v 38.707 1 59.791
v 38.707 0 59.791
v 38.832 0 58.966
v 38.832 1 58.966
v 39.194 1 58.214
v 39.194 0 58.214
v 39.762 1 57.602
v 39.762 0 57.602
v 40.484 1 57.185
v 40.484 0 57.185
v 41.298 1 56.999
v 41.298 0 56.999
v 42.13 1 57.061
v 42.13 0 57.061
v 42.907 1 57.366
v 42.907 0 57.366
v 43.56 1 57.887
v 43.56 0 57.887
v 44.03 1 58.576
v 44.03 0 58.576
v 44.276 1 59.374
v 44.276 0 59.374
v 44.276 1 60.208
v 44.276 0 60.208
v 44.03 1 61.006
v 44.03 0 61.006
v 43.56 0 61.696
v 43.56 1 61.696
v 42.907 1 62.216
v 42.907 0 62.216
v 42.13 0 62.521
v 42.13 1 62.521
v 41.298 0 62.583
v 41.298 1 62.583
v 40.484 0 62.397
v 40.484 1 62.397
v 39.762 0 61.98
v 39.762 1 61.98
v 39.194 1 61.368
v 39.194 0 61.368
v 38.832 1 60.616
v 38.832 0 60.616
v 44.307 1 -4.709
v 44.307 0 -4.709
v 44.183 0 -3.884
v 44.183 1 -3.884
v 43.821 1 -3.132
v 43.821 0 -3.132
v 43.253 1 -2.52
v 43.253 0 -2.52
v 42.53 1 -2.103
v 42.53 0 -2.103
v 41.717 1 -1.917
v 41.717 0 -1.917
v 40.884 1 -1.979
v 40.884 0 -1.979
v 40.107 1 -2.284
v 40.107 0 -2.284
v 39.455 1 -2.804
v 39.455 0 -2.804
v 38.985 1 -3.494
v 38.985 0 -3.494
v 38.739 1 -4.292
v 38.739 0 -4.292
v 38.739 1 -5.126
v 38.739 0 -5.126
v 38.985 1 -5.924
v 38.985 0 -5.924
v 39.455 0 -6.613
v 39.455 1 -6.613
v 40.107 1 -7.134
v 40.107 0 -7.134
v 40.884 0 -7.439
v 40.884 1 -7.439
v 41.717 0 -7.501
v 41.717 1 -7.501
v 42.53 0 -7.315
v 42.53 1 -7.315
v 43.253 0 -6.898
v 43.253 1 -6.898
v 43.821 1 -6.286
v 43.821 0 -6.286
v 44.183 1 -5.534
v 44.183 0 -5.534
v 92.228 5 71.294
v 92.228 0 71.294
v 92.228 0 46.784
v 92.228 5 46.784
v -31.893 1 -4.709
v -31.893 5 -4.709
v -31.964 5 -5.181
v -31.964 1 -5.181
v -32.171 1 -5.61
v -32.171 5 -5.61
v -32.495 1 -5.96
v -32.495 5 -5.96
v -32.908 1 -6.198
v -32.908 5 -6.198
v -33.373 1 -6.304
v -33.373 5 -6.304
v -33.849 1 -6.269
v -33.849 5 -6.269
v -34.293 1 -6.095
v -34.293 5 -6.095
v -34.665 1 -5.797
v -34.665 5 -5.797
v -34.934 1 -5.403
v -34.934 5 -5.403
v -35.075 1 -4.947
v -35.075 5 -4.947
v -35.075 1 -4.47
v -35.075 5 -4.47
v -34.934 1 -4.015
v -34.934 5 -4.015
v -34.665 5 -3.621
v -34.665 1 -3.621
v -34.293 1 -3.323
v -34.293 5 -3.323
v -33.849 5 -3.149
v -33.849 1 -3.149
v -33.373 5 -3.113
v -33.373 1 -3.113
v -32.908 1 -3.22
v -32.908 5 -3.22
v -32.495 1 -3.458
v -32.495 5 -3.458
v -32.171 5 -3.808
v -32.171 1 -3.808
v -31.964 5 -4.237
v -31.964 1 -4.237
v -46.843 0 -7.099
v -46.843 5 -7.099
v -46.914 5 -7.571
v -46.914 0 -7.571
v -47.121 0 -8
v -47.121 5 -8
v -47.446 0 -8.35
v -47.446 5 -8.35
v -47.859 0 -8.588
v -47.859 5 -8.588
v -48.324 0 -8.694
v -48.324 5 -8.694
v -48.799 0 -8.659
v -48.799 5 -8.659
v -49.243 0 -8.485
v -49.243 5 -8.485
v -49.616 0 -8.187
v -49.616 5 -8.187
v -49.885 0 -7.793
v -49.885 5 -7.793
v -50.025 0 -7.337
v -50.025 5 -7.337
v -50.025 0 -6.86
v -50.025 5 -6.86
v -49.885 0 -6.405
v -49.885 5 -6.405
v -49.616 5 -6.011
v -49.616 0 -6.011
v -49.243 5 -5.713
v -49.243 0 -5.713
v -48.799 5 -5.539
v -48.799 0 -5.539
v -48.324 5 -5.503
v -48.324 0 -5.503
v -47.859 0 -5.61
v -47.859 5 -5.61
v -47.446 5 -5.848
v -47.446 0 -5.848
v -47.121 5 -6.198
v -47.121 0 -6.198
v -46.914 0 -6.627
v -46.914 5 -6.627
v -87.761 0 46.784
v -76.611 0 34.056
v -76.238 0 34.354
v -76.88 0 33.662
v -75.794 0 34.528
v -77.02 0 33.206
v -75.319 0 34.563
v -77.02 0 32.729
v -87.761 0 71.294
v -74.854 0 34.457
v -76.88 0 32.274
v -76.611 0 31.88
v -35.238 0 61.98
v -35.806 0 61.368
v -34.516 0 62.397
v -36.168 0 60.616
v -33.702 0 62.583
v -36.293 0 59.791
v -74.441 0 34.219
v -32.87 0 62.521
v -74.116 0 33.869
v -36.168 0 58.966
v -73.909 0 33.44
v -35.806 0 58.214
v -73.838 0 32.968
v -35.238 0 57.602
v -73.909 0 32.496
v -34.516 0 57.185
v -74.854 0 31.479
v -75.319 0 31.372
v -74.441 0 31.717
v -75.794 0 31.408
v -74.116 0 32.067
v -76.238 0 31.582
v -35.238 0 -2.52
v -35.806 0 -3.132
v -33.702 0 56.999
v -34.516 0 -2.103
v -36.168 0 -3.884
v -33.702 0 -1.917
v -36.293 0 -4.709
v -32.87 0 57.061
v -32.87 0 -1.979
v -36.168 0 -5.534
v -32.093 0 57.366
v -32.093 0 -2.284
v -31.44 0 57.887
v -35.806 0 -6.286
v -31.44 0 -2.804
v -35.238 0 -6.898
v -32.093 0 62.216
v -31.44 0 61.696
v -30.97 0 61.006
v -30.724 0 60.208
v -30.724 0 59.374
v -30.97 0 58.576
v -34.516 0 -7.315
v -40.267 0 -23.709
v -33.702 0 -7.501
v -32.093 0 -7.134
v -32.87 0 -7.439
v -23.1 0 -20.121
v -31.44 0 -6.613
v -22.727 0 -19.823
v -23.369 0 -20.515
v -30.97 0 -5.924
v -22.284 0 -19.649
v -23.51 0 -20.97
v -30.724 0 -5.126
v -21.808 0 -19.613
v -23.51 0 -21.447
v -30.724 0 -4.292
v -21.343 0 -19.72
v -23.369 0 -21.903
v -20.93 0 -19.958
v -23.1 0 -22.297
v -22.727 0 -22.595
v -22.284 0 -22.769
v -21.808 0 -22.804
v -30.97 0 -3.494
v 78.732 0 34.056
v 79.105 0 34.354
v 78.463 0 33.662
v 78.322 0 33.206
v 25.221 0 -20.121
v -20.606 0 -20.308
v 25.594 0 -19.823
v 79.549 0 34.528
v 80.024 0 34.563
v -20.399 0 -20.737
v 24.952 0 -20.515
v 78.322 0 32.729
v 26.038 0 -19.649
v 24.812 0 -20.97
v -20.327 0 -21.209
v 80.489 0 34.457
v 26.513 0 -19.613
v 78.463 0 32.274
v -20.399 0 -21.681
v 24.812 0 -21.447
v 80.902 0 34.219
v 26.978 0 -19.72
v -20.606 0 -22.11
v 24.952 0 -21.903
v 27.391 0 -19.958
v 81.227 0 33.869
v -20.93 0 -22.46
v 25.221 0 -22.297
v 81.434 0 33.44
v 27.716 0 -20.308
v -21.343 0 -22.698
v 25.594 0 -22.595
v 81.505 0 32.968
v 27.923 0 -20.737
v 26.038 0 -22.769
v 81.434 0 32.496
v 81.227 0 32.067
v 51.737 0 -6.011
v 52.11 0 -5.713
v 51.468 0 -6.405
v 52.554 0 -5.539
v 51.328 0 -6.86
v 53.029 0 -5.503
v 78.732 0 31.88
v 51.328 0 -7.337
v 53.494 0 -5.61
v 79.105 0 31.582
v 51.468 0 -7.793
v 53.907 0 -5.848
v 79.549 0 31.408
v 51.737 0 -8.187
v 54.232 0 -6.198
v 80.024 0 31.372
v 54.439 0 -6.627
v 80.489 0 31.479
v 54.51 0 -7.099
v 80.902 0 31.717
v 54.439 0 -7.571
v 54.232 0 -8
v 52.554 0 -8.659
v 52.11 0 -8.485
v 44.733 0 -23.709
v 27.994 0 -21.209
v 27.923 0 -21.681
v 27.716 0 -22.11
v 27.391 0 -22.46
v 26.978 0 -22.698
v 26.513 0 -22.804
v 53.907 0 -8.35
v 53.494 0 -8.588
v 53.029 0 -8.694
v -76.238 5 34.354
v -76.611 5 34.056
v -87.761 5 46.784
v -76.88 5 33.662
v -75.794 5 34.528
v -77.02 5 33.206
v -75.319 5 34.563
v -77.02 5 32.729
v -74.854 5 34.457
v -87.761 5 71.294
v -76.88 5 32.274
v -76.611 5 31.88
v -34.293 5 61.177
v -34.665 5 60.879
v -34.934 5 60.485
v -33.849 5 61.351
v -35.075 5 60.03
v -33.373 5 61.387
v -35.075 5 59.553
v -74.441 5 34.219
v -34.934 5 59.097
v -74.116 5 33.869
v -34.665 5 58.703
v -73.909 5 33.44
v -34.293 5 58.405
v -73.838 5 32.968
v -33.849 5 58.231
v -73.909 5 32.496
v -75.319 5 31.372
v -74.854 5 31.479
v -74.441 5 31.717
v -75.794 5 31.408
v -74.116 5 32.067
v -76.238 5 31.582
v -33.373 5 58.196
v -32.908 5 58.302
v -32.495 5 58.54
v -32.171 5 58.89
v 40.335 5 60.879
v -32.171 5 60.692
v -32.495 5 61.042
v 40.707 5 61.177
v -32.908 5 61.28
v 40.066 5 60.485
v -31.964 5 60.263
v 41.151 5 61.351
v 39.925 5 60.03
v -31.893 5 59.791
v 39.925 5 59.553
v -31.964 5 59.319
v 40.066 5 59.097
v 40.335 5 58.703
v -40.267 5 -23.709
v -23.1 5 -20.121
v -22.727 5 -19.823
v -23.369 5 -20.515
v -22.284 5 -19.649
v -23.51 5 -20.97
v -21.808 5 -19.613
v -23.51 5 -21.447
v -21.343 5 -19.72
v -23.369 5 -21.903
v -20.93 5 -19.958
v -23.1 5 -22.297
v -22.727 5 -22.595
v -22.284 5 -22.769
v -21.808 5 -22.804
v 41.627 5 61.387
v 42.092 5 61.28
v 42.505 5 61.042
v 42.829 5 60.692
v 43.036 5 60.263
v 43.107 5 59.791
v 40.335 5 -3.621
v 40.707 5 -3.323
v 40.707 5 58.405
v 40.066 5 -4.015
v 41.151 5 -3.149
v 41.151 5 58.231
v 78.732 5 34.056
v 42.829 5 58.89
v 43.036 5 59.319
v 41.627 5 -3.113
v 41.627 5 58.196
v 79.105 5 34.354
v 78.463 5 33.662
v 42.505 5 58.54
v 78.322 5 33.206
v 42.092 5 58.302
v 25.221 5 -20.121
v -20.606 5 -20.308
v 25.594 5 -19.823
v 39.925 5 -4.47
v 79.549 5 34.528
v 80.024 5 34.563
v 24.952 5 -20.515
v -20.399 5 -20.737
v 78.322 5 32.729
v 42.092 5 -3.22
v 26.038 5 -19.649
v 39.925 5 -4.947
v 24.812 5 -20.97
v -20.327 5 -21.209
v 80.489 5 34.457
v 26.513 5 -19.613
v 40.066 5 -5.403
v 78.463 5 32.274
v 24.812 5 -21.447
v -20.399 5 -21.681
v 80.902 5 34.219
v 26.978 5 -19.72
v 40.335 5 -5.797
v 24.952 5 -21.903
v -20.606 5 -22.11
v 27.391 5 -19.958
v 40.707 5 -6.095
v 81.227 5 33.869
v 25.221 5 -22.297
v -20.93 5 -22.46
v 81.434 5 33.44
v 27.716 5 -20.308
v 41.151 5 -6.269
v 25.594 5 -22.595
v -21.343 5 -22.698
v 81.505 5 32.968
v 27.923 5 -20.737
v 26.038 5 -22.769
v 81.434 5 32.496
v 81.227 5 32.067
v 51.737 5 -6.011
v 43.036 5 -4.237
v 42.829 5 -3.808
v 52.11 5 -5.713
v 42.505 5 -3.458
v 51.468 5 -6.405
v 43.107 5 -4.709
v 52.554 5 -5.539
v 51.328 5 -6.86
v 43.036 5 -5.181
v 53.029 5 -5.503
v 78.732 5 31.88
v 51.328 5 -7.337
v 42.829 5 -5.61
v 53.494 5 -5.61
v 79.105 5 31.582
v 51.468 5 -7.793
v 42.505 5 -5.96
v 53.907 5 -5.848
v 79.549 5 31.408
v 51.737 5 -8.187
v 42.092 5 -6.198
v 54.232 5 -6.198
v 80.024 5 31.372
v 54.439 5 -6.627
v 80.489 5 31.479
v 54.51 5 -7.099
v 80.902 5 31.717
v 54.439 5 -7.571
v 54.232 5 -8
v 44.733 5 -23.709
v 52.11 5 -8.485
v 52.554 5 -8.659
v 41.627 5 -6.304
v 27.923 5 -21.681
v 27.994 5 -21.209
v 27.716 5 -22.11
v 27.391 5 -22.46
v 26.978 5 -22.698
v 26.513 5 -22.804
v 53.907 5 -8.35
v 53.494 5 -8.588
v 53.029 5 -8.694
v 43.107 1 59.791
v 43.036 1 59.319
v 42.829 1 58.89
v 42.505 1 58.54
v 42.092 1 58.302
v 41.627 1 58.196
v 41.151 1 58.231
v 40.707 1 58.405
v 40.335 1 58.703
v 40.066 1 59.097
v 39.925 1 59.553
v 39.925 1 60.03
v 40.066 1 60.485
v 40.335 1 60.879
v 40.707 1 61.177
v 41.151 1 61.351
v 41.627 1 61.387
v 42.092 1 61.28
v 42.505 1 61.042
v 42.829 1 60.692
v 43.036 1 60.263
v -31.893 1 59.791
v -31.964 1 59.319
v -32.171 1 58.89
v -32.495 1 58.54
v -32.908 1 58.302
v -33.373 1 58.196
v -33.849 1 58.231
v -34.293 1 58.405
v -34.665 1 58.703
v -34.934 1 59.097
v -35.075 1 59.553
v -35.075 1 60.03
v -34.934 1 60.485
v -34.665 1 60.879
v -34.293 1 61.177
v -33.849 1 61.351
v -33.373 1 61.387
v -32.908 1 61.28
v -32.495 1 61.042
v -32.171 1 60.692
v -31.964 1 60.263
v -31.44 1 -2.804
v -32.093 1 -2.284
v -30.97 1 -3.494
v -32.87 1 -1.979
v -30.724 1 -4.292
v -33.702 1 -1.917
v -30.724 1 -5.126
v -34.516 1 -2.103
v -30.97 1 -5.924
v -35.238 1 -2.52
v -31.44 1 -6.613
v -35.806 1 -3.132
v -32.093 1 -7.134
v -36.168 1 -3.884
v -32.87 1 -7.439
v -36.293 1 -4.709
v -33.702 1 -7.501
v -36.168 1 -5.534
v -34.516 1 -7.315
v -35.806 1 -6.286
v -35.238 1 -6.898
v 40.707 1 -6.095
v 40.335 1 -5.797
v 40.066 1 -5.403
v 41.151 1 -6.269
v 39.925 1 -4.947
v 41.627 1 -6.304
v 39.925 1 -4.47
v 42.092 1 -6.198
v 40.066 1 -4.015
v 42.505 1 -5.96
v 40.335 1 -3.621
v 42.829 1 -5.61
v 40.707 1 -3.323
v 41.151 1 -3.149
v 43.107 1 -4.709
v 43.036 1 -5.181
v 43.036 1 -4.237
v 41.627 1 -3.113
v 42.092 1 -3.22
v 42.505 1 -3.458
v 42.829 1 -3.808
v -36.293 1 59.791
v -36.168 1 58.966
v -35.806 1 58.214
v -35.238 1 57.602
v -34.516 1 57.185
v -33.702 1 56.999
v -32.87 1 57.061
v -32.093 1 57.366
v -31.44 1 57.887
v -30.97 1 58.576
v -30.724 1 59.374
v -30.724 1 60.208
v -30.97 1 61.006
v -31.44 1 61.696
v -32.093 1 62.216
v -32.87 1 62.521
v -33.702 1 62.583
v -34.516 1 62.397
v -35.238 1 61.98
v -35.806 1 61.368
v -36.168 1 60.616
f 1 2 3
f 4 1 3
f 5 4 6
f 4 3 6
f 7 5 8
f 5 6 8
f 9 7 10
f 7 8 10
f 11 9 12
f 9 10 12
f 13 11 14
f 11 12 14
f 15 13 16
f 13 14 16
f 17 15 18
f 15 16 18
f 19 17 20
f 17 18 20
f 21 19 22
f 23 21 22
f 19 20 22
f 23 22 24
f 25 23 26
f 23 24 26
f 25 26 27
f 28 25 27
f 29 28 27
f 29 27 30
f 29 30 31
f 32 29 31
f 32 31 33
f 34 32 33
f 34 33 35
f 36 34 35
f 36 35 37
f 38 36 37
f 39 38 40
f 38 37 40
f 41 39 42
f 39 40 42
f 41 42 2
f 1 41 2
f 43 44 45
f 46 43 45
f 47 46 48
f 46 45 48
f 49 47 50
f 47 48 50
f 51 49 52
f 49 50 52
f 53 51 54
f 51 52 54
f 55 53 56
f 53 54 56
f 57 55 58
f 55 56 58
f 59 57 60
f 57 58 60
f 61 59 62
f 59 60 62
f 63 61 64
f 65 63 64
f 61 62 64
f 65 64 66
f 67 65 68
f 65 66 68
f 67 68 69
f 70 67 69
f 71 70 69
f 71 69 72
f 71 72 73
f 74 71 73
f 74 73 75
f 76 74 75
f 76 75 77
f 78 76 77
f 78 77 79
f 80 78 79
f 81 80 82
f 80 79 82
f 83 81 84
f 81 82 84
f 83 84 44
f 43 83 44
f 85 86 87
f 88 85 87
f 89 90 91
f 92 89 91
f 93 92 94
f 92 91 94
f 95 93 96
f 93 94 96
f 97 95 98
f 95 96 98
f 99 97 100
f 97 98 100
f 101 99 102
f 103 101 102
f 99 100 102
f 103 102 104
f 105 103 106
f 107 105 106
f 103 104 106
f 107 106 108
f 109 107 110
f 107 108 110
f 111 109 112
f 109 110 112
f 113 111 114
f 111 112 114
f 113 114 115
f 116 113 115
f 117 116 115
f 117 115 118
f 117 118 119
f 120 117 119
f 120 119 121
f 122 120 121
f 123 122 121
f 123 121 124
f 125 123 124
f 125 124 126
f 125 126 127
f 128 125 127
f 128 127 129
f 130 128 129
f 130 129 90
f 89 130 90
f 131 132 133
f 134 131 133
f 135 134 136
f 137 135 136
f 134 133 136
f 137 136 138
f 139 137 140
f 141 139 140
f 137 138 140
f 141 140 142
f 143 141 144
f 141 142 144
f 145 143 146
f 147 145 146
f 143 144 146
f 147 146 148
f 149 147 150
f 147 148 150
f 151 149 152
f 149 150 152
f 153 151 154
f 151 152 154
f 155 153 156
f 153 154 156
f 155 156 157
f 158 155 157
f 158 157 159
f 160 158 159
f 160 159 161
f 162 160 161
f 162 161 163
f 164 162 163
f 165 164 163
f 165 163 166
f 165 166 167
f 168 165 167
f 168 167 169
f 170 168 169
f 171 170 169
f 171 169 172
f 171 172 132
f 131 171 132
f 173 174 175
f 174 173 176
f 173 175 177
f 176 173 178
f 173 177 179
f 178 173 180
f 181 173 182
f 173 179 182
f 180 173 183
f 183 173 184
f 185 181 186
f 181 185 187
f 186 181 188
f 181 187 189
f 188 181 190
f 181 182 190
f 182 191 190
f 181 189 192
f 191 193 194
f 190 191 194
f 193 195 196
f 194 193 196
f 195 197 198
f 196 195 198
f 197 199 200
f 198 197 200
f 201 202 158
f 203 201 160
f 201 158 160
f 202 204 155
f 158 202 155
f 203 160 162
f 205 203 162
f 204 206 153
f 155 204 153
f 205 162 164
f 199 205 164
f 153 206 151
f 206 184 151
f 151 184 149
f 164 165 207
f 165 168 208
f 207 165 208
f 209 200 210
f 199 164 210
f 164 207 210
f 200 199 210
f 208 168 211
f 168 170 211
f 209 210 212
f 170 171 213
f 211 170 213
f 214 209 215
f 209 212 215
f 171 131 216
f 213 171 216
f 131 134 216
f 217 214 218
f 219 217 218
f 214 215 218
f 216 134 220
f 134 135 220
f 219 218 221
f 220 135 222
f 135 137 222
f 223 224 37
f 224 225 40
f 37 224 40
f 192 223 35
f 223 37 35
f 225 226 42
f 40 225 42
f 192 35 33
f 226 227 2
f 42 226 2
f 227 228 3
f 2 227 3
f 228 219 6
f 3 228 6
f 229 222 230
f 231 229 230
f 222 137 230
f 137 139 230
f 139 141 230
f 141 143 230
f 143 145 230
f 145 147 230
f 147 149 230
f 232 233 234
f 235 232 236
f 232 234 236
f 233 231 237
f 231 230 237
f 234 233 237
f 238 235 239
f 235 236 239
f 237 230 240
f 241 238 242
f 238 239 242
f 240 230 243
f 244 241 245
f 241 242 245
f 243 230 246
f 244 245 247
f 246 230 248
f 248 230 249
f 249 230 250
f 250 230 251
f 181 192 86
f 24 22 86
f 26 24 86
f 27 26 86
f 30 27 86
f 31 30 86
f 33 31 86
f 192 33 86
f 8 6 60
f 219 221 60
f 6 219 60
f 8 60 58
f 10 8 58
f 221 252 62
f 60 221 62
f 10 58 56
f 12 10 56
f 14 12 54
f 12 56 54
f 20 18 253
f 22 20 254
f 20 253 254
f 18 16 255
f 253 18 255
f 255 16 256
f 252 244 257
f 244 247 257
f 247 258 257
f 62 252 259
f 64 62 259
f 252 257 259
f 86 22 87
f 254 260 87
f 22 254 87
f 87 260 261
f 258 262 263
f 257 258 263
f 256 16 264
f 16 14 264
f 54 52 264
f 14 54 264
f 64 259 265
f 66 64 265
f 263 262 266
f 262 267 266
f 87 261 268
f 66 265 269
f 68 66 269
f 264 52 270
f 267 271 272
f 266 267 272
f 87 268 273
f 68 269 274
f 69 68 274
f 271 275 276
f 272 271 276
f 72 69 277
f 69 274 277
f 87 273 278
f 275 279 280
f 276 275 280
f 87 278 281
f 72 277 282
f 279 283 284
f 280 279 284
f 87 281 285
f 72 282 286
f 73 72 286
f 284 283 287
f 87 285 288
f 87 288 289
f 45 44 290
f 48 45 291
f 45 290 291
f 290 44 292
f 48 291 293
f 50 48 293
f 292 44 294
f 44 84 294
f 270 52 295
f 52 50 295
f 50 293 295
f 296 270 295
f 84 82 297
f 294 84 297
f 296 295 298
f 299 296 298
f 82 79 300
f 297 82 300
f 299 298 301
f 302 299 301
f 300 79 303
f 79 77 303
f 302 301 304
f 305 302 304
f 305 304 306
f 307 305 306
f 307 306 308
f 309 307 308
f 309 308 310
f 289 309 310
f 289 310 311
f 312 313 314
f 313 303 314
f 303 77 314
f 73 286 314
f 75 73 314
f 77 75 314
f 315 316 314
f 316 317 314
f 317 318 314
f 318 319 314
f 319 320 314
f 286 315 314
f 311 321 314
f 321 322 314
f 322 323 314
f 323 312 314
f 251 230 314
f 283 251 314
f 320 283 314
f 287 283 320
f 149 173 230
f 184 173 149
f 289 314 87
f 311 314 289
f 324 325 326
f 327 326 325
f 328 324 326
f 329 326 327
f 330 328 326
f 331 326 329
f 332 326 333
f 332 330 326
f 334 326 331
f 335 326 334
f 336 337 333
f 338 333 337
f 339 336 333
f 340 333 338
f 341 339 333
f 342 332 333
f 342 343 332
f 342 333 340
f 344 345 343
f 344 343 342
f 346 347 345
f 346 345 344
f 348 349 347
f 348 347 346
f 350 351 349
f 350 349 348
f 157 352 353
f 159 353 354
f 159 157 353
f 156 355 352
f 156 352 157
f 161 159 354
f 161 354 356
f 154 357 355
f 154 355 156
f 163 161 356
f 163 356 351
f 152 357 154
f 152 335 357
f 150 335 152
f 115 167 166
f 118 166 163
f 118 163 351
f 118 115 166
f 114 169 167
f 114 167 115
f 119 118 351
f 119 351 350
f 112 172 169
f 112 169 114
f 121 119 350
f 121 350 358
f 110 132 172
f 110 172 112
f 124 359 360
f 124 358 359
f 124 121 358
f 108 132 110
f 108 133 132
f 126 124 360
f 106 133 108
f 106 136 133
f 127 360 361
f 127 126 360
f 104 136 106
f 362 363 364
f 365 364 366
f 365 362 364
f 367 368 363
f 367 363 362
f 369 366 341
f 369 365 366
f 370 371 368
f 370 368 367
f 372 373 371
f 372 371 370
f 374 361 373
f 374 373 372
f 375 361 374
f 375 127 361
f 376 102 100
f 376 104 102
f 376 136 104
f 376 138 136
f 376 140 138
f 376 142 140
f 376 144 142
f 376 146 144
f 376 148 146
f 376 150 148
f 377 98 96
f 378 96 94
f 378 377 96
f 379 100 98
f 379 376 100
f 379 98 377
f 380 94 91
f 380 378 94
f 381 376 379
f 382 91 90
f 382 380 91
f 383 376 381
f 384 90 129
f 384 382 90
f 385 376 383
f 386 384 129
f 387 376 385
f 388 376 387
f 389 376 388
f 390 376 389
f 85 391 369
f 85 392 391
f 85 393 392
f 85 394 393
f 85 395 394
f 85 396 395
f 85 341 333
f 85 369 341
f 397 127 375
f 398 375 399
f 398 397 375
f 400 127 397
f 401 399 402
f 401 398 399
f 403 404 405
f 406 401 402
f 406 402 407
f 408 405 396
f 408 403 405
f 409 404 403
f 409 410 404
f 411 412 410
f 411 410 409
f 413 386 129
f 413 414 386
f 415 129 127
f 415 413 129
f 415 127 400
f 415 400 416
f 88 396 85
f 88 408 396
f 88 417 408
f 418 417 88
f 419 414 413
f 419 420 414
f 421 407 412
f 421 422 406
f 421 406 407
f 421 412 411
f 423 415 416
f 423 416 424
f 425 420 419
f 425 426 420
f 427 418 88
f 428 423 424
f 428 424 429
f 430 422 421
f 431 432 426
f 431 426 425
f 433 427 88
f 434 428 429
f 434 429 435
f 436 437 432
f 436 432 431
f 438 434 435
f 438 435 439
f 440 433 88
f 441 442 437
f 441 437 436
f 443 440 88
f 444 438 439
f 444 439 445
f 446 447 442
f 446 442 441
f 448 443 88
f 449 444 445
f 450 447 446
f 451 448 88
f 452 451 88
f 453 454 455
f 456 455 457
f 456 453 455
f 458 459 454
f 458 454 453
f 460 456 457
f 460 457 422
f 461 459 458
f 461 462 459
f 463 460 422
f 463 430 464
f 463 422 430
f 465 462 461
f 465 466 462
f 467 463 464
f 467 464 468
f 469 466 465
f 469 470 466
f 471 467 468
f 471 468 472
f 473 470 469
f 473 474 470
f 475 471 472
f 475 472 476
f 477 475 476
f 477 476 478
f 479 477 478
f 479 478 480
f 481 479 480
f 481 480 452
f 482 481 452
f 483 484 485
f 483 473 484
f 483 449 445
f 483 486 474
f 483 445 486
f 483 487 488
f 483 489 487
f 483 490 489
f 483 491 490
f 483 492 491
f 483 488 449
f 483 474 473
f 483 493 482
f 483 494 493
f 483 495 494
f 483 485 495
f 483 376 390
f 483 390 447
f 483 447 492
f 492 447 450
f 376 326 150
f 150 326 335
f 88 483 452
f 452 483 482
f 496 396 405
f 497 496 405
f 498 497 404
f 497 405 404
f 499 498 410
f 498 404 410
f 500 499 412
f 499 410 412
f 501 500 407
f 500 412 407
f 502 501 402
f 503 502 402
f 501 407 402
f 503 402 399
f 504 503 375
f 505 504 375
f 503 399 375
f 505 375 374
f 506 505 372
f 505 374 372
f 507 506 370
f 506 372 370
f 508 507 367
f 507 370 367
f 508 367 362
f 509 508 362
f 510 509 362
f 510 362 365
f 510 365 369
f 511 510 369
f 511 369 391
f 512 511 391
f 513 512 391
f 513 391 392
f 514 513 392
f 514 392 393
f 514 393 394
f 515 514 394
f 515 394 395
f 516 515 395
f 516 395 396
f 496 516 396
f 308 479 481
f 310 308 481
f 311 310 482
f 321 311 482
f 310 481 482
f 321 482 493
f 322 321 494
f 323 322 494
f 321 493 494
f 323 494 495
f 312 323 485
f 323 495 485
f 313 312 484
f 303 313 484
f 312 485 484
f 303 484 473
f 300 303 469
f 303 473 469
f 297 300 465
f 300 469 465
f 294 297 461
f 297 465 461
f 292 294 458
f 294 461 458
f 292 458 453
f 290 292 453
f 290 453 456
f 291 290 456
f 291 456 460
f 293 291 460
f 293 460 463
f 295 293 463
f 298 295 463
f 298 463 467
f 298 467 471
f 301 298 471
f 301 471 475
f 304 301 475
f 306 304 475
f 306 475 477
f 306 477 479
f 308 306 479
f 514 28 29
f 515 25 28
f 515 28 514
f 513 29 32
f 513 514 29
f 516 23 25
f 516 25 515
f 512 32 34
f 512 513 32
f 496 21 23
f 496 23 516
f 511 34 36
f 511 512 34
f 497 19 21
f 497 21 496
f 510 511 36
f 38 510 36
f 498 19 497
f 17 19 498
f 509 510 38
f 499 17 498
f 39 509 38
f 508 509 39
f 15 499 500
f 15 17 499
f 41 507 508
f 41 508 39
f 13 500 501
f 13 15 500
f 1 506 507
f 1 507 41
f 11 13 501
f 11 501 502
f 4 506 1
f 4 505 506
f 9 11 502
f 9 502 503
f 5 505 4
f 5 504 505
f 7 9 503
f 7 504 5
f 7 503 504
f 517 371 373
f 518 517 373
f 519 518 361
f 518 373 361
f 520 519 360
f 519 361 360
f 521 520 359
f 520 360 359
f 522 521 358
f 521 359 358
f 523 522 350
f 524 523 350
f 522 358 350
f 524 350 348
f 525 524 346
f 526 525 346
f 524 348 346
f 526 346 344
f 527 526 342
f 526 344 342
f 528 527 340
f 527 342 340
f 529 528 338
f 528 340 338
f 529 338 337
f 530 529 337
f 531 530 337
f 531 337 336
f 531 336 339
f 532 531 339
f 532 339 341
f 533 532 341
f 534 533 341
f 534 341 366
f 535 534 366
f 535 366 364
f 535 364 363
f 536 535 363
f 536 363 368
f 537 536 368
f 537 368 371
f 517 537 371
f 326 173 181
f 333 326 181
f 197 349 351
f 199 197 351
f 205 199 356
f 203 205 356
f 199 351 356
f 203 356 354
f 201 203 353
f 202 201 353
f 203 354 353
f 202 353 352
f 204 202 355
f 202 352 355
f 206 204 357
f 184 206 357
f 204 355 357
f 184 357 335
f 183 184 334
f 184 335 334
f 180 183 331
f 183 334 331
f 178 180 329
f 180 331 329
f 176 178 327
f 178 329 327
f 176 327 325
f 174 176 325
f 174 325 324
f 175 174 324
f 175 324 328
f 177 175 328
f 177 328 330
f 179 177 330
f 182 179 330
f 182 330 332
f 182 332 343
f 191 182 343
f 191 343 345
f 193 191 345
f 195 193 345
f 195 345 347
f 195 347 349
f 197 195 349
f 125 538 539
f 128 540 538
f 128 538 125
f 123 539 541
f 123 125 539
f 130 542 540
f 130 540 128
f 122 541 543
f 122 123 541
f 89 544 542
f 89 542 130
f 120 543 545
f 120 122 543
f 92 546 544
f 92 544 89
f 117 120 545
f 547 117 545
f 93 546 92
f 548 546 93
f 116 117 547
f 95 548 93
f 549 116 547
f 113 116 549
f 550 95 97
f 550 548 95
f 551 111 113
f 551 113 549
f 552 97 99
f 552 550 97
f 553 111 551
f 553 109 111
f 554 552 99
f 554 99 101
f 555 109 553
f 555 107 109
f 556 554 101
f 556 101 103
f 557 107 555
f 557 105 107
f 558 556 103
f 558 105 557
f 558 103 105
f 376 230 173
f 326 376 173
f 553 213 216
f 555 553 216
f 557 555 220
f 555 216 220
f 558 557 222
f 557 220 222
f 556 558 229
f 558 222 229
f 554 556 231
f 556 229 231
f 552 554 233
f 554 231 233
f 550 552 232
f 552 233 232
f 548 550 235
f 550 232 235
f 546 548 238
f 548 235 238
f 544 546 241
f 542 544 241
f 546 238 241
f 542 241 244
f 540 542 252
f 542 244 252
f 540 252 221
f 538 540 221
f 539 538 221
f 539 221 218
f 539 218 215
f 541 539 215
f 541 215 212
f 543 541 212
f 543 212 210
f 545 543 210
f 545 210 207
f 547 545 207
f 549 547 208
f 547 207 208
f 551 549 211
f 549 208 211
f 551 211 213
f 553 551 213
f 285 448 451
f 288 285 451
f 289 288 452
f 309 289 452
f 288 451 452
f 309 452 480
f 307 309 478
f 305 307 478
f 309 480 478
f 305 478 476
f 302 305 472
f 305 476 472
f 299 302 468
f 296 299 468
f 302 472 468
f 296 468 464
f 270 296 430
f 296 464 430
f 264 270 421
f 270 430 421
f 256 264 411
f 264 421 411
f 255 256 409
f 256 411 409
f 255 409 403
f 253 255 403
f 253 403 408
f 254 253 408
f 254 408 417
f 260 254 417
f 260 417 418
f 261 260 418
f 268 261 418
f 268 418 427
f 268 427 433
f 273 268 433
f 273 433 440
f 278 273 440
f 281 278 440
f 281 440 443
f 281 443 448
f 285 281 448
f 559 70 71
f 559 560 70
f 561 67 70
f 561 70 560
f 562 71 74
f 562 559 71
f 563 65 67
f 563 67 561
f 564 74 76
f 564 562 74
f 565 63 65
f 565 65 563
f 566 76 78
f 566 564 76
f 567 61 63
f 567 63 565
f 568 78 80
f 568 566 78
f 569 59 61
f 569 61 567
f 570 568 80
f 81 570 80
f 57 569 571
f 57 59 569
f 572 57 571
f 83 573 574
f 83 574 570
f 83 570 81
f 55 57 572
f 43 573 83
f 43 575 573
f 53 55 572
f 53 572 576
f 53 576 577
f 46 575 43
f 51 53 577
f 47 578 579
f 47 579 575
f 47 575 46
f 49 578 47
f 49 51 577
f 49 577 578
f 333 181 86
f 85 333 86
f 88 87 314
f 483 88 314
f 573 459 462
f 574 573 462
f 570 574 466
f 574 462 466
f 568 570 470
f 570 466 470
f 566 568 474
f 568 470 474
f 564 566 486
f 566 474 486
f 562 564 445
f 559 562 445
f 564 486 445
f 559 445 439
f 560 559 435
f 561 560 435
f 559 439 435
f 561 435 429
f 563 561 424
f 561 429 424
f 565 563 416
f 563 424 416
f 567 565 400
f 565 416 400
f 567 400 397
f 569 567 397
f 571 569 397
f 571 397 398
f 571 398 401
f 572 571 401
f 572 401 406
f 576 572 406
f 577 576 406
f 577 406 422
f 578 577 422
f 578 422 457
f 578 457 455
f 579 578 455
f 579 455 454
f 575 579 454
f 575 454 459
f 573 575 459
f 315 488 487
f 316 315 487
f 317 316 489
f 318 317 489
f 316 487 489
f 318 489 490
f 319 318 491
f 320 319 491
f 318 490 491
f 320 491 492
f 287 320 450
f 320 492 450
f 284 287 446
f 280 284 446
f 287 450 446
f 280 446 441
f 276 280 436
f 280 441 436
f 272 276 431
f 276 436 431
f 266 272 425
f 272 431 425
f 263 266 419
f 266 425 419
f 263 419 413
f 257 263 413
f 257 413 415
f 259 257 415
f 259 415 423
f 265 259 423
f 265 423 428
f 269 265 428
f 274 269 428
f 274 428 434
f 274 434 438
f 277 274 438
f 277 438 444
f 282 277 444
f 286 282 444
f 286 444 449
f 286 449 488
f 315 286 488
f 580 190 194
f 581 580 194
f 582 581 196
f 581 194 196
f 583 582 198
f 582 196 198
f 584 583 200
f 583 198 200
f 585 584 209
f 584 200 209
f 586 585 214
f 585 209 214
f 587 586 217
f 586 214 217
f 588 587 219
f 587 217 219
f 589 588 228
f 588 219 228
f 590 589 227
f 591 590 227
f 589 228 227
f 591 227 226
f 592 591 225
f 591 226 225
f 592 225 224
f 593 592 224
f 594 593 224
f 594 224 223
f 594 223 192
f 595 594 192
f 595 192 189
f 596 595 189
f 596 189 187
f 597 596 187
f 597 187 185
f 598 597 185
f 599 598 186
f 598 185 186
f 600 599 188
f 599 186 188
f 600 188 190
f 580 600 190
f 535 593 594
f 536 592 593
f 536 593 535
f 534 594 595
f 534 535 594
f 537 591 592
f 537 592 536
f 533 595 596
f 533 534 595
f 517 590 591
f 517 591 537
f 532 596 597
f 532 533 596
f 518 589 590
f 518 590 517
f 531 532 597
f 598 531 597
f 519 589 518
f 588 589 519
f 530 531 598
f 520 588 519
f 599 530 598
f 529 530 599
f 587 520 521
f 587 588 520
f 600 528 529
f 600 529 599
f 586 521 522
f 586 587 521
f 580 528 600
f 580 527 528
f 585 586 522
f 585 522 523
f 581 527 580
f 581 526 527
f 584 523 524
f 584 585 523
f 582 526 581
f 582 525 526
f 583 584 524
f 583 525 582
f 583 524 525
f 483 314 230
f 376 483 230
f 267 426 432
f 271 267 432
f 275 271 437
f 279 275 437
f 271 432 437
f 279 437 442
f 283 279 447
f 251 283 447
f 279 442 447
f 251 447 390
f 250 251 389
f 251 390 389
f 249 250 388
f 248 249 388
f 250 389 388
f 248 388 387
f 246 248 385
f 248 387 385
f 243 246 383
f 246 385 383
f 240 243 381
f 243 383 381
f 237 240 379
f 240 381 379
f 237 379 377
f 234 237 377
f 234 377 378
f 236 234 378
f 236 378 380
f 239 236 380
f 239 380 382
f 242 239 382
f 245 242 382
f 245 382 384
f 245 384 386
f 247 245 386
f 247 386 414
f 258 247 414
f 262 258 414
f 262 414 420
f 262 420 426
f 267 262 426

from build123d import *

# Parameters (mm, degrees)
BOSS_EXTRUDE1_DEPTH = 5
SKETCH2_R           = 1.6
CUT_EXTRUDE1_DEPTH  = 10
SKETCH3_R           = 1.6
CUT_EXTRUDE2_DEPTH  = 13
SKETCH5_R           = 2.8
CUT_EXTRUDE3_DEPTH  = 1
SKETCH4_R           = 2.8
CUT_EXTRUDE4_DEPTH  = 1


with BuildPart() as part:
    # Sketch1 → Boss-Extrude1 (new body)
    with BuildSketch(Plane(origin=(0, 0, 0), x_dir=(1, 0, 0), z_dir=(0, 1, 0))):
        Polygon((44.733199147, 23.708961101), (-40.266800853, 23.708961101), (-87.761294074, -46.784110287), (-87.761294074, -71.294110287), (92.227692368, -71.294110287), (92.227692368, -46.784110287), align=None)
    extrude(amount=BOSS_EXTRUDE1_DEPTH)

    # Sketch2 → Cut-Extrude1 (cut)
    with BuildSketch(Plane(origin=(0, 5, 0), x_dir=(1, 0, 0), z_dir=(0, 1, 0))):
        with Locations((-21.927484651, 21.208961101)):
            Circle(SKETCH2_R)
        with Locations((26.393882946, 21.208961101)):
            Circle(SKETCH2_R)
        with Locations((-48.443257362, 7.098961101)):
            Circle(SKETCH2_R)
        with Locations((-75.438186307, -32.967904005)):
            Circle(SKETCH2_R)
        with Locations((52.909655656, 7.098961101)):
            Circle(SKETCH2_R)
        with Locations((79.904584601, -32.967904005)):
            Circle(SKETCH2_R)
    extrude(amount=-CUT_EXTRUDE1_DEPTH, mode=Mode.SUBTRACT)

    # Sketch3 → Cut-Extrude2 (cut)
    with BuildSketch(Plane(origin=(0, 5, 0), x_dir=(1, 0, 0), z_dir=(0, 1, 0))):
        with Locations((-33.49256942, 4.708961101)):
            Circle(SKETCH3_R)
        with Locations((41.50743058, 4.708961101)):
            Circle(SKETCH3_R)
        with Locations((41.50743058, -59.791038899)):
            Circle(SKETCH3_R)
        with Locations((-33.49256942, -59.791038899)):
            Circle(SKETCH3_R)
    extrude(amount=-CUT_EXTRUDE2_DEPTH, mode=Mode.SUBTRACT)

    # Sketch5 → Cut-Extrude3 (cut)
    with BuildSketch(Plane(origin=(0, 0, 0), x_dir=(-1, 0, 0), z_dir=(0, -1, 0))):
        with Locations((33.49256942, 4.708961101)):
            Circle(SKETCH5_R)
        with Locations((33.49256942, -59.791038899)):
            Circle(SKETCH5_R)
        with Locations((-41.50743058, -59.791038899)):
            Circle(SKETCH5_R)
    extrude(amount=-CUT_EXTRUDE3_DEPTH, mode=Mode.SUBTRACT)

    # Sketch4 → Cut-Extrude4 (cut)
    with BuildSketch(Plane.XZ):
        with Locations((41.50743058, -4.708961101)):
            Circle(SKETCH4_R)
    extrude(amount=-CUT_EXTRUDE4_DEPTH, mode=Mode.SUBTRACT)


solid = part.part
